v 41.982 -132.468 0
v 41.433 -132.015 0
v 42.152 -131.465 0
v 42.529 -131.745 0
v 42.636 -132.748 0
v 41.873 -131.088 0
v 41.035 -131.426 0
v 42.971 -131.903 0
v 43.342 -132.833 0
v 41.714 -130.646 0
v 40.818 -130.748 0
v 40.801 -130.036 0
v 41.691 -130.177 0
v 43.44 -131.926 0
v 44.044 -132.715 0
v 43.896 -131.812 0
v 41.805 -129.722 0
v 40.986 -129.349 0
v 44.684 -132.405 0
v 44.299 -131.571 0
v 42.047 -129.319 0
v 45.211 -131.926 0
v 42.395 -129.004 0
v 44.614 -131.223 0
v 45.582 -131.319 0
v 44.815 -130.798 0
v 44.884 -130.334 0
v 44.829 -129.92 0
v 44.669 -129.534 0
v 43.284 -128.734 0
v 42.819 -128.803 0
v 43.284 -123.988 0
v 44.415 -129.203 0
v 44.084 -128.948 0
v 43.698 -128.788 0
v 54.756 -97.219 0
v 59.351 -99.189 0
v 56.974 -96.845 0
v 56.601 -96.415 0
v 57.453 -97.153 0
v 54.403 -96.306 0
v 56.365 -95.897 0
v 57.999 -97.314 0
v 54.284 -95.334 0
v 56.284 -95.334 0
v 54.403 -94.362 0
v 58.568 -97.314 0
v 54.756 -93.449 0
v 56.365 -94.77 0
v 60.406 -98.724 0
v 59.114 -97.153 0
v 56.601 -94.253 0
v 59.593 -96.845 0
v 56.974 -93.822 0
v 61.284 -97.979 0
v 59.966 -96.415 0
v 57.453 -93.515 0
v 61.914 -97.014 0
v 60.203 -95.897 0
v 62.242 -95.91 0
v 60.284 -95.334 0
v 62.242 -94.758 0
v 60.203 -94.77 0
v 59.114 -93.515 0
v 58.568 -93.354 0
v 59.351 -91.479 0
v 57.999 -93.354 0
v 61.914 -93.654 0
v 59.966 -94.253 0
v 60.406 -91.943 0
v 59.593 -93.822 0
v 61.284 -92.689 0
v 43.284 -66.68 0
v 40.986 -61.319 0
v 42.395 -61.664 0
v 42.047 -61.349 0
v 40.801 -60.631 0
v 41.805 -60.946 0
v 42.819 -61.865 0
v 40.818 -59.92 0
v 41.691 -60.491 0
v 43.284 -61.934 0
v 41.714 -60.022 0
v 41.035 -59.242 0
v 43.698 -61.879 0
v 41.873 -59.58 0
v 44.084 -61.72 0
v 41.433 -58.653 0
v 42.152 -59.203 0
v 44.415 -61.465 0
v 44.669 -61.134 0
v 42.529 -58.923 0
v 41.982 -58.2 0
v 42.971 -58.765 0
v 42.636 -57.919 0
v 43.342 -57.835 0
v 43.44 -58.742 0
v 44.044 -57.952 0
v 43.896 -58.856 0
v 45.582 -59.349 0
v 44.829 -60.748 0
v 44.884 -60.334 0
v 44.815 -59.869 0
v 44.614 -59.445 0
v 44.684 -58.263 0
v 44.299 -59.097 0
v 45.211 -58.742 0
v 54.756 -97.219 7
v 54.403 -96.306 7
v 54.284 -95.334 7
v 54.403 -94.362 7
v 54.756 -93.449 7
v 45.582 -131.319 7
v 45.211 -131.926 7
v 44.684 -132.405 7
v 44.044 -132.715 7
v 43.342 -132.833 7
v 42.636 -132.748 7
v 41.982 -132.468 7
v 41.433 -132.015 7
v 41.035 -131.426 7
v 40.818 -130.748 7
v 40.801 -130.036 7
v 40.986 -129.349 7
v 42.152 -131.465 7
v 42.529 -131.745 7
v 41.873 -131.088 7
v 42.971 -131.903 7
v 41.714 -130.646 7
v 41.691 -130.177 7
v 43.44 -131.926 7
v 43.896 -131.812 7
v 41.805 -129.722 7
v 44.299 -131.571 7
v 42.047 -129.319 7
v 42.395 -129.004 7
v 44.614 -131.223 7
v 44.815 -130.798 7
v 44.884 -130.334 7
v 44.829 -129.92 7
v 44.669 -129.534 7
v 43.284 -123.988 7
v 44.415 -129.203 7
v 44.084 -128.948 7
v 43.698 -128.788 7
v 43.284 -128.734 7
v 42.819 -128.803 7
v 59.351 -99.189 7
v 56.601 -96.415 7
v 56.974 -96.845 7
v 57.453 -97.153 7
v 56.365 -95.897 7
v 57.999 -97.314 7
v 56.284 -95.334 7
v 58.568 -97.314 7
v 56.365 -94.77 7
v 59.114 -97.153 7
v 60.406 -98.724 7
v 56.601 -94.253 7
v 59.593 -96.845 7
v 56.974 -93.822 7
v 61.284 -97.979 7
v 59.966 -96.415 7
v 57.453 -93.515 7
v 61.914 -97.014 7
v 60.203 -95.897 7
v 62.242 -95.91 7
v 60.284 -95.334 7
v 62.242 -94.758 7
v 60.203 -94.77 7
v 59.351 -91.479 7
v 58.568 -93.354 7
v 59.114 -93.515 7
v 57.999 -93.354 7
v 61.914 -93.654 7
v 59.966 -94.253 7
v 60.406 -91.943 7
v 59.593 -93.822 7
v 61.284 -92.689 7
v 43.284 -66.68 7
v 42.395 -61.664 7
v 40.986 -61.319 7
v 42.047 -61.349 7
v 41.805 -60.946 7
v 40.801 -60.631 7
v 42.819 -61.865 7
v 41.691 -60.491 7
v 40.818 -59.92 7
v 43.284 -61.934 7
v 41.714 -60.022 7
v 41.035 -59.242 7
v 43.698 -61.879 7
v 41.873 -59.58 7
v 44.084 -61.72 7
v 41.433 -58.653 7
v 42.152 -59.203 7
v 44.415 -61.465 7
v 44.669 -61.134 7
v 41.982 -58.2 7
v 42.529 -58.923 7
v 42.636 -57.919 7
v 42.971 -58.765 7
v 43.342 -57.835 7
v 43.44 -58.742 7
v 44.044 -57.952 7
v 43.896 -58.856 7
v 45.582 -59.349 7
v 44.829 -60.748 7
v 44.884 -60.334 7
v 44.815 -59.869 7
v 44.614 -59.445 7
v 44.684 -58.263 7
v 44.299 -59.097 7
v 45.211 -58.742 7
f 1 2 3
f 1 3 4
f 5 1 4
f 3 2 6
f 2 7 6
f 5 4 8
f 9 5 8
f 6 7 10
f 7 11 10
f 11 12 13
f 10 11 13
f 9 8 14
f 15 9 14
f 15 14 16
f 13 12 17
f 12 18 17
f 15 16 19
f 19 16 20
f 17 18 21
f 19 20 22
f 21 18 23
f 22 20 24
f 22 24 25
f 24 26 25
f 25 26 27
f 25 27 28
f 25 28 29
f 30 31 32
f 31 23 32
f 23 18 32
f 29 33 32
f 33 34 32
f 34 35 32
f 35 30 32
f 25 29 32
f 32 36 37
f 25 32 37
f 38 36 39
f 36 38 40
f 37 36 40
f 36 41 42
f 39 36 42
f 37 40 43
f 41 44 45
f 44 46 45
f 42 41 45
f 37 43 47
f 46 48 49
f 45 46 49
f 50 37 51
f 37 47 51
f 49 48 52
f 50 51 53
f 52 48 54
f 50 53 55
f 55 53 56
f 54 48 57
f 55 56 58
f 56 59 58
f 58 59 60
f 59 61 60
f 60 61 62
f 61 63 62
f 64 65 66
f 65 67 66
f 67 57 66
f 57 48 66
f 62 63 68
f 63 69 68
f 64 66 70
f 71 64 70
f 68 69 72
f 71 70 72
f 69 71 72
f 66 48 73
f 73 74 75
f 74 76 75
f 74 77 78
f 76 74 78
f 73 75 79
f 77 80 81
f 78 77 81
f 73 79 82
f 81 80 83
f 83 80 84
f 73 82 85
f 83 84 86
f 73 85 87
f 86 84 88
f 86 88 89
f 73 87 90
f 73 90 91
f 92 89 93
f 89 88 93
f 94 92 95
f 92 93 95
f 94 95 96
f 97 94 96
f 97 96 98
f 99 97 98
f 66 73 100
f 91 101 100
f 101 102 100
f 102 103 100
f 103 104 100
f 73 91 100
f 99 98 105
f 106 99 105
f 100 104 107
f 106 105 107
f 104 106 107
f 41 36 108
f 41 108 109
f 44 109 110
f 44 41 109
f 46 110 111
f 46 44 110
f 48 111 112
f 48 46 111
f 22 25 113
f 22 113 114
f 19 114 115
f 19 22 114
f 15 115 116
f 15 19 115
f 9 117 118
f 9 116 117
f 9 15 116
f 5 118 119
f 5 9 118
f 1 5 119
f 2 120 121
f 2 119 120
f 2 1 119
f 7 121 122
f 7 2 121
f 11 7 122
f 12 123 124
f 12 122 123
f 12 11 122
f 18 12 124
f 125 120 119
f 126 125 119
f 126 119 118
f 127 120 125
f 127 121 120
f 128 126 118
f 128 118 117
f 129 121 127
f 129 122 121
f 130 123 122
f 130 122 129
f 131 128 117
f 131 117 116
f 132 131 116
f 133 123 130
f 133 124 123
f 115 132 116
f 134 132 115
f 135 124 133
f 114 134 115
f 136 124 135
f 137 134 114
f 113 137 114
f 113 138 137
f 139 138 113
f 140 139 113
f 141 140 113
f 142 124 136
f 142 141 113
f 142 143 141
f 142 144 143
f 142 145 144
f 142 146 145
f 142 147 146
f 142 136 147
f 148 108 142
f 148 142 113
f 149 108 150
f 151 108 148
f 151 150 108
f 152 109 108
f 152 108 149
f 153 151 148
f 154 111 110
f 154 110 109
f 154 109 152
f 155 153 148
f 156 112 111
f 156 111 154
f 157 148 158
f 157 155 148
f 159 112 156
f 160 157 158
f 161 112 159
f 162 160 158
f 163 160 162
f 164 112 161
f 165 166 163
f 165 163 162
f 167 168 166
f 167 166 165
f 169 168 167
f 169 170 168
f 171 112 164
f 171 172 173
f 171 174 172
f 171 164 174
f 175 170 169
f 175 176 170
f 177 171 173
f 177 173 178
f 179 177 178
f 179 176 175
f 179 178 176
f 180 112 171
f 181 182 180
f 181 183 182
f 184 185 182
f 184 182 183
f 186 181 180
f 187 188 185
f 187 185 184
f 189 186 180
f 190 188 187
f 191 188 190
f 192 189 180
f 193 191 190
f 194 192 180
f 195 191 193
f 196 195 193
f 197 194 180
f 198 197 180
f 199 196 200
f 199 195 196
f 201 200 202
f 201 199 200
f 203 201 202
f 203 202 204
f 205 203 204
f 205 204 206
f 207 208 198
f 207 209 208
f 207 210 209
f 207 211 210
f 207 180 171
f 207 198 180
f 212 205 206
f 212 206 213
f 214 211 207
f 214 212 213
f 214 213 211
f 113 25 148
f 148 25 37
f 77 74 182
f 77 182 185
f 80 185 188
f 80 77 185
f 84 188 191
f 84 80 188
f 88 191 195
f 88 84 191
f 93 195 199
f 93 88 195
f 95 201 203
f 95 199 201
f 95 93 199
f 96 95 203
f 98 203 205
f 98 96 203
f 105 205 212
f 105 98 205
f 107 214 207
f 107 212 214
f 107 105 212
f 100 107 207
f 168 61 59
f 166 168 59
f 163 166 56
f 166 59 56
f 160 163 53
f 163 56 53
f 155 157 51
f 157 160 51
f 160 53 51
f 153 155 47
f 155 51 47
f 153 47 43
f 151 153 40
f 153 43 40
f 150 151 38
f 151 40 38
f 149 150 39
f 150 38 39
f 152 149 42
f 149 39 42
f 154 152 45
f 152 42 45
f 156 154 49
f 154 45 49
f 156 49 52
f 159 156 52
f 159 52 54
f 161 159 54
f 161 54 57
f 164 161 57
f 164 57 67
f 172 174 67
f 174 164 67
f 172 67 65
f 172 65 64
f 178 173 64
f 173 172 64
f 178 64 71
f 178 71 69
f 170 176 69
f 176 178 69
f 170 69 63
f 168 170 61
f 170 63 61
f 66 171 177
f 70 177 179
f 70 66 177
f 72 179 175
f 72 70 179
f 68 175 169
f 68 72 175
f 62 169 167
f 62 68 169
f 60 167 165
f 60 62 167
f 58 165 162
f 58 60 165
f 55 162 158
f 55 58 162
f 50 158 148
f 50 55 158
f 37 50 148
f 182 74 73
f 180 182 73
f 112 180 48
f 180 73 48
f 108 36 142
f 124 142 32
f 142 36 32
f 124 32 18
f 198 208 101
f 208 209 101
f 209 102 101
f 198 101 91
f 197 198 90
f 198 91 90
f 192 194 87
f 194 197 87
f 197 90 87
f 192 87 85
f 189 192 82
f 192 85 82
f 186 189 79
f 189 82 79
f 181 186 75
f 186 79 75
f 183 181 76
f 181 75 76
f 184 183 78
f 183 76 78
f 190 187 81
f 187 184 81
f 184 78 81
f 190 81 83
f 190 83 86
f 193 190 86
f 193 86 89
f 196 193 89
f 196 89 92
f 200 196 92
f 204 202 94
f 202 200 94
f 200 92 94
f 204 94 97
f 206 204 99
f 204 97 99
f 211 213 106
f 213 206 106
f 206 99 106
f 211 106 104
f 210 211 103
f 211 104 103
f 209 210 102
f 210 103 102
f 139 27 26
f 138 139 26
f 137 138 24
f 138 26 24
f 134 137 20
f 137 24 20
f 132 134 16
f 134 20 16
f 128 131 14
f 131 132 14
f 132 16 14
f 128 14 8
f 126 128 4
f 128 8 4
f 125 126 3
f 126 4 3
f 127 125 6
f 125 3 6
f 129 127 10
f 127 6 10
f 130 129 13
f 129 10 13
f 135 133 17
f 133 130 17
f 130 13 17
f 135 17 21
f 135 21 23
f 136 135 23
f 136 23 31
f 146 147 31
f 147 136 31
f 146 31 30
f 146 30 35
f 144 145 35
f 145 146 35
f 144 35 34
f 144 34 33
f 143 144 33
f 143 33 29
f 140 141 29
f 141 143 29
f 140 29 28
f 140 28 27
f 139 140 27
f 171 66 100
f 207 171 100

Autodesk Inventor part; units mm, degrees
ref_plane "YZ Plane" through (0, 0, 0) normal (1, 0, 0) x (0, 1, 0)
ref_plane "XZ Plane" through (0, 0, 0) normal (0, 1, 0) x (-1, 0, 0)
ref_plane "XY Plane" through (0, 0, 0) normal (0, 0, 1) x (1, 0, 0)
ref_plane "РабПлоскость1" through (0, 0, 0) normal (0, 0, 1) x (1, 0, 0)
sketch "Эскиз1" plane through (0, 0, 0) normal (0, 0, 1) x (1, 0, 0)
  circle A0 centre (43.2836, -60.3339) radius 1.5 projected
  circle A1 centre (43.2836, -130.3339) radius 1.5 projected
  circle A2 centre (43.2836, -60.3339) radius 1.6
  circle A3 centre (43.2836, -130.3339) radius 1.6
  line L0 (43.2836, -60.3339) -> (43.2836, -130.3339)
  line L1 (43.2836, -95.3339) -> (58.2836, -95.3339)
  circle A4 centre (58.2836, -95.3339) radius 2
  circle A5 centre (58.2836, -95.3339) radius 4
  line L2 (58.2836, -95.3339) -> (43.2836, -60.3339) construction
  line L3 (60.5815, -94.3491) -> (45.5815, -59.3491)
  line L4 (40.9858, -61.3187) -> (55.9858, -96.3187)
  arc A6 (55.9858, -96.3187) -> (60.5815, -94.3491) centre (58.2836, -95.3339) ccw
  arc A7 (45.5815, -59.3491) -> (40.9858, -61.3187) centre (43.2836, -60.3339) ccw
  line L5 (58.2836, -95.3339) -> (43.2836, -130.3339) construction
  line L6 (55.9858, -94.3491) -> (40.9858, -129.3491)
  line L7 (45.5815, -131.3187) -> (60.5815, -96.3187)
  arc A8 (60.5815, -96.3187) -> (55.9858, -94.3491) centre (58.2836, -95.3339) ccw
  arc A9 (40.9858, -129.3491) -> (45.5815, -131.3187) centre (43.2836, -130.3339) ccw
  point P0 (0, 0)
  point P1 (50.7836, -77.8339)
  point P2 (50.7836, -112.8339)
  point P3 (59.3515, -99.1887)
  point P4 (59.3515, -91.4791)
  point P5 (54.7558, -93.4487)
  point P6 (54.7558, -97.2191)
  dimension "d0" = 3.2
  dimension "d1" = 3.2
  dimension "d2" = 15
  dimension "d3" = 4
  dimension "d4" = 8
  dimension "d5" = 5
  dimension "d6" = 5
extrude "Выдавливание1" add sketch "Эскиз1" along normal blind 7 contours L4 A7 L3 A5 | L4 L1 A5 | A5 L3 A8 L6 L4 | L6 A5 L7 A9 | L1 L6 A5 | A5 L7 A6 L3 | L6 A8 A6 L4 | L4 A6 L7 A5 L6
properties part number "Шаблон"
